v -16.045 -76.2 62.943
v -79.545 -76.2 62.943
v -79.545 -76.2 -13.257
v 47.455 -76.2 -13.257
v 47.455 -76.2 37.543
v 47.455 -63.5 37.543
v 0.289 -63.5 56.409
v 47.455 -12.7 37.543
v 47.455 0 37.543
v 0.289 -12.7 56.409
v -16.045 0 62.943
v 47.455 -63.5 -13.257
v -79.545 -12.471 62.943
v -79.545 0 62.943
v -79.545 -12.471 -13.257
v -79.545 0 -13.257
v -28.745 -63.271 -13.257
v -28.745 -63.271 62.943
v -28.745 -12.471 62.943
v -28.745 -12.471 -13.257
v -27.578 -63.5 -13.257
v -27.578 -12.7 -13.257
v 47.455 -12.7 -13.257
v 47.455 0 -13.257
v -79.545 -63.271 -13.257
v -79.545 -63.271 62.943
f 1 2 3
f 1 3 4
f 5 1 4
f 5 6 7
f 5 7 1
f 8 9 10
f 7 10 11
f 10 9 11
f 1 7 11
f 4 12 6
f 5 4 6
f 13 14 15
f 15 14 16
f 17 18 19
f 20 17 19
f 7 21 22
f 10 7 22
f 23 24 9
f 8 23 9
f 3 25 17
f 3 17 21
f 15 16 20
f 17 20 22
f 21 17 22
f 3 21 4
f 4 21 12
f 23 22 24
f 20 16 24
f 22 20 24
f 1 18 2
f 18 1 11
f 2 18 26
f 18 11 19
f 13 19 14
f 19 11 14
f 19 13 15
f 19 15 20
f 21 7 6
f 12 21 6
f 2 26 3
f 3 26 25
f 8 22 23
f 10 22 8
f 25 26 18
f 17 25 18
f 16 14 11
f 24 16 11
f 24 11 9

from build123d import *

# Parameters (mm, degrees)
F1_DEPTH = 76.2
F2_W     = 50.8
F2_H     = 50.8
F3_DEPTH = 94.234
F4_W     = 50.8
F4_H     = 134.9397847399
F5_DEPTH = 41.656
F6_W     = 50.8
F6_H     = 50.8
F7_DEPTH = 88.138


with BuildPart() as f1:
    # F0 (on Front) → F1 (new body)
    with BuildSketch(Plane.XZ):
        Polygon((-79.544827342, 62.9425281554), (-79.544827342, -13.2574718446), (47.455172658, -13.2574718446), (47.455172658, 37.5425281554), (-16.044827342, 62.9425281554), align=None)
    extrude(amount=F1_DEPTH)

    # F2 (on face) → F3 (cut)
    with BuildSketch(Plane(origin=(19.4912404202, 0, 48.7281010505), x_dir=(0.9284766909, 0, -0.3713906764), z_dir=(0.3713906764, 0, 0.9284766909))):
        with Locations((4.7180767512, -38.1)):
            Rectangle(F2_W, F2_H)
    extrude(amount=-F3_DEPTH, mode=Mode.SUBTRACT)

    # F4 (on face) → F5 (cut)
    with BuildSketch(Plane(origin=(27.9639322377, 0, -11.1855728951), x_dir=(0, -1, 0), z_dir=(-0.9284766909, 0, 0.3713906764))):
        with Locations((38.1, 65.2383889087)):
            Rectangle(F4_W, F4_H)
    extrude(amount=-F5_DEPTH, mode=Mode.SUBTRACT)

    # F6 (on face) → F7 (cut)
    with BuildSketch(Plane.XY.offset(62.9425281554)):
        with Locations((-54.144827342, -37.8712617517)):
            Rectangle(F6_W, F6_H)
    extrude(amount=-F7_DEPTH, mode=Mode.SUBTRACT)


solid = f1.part
